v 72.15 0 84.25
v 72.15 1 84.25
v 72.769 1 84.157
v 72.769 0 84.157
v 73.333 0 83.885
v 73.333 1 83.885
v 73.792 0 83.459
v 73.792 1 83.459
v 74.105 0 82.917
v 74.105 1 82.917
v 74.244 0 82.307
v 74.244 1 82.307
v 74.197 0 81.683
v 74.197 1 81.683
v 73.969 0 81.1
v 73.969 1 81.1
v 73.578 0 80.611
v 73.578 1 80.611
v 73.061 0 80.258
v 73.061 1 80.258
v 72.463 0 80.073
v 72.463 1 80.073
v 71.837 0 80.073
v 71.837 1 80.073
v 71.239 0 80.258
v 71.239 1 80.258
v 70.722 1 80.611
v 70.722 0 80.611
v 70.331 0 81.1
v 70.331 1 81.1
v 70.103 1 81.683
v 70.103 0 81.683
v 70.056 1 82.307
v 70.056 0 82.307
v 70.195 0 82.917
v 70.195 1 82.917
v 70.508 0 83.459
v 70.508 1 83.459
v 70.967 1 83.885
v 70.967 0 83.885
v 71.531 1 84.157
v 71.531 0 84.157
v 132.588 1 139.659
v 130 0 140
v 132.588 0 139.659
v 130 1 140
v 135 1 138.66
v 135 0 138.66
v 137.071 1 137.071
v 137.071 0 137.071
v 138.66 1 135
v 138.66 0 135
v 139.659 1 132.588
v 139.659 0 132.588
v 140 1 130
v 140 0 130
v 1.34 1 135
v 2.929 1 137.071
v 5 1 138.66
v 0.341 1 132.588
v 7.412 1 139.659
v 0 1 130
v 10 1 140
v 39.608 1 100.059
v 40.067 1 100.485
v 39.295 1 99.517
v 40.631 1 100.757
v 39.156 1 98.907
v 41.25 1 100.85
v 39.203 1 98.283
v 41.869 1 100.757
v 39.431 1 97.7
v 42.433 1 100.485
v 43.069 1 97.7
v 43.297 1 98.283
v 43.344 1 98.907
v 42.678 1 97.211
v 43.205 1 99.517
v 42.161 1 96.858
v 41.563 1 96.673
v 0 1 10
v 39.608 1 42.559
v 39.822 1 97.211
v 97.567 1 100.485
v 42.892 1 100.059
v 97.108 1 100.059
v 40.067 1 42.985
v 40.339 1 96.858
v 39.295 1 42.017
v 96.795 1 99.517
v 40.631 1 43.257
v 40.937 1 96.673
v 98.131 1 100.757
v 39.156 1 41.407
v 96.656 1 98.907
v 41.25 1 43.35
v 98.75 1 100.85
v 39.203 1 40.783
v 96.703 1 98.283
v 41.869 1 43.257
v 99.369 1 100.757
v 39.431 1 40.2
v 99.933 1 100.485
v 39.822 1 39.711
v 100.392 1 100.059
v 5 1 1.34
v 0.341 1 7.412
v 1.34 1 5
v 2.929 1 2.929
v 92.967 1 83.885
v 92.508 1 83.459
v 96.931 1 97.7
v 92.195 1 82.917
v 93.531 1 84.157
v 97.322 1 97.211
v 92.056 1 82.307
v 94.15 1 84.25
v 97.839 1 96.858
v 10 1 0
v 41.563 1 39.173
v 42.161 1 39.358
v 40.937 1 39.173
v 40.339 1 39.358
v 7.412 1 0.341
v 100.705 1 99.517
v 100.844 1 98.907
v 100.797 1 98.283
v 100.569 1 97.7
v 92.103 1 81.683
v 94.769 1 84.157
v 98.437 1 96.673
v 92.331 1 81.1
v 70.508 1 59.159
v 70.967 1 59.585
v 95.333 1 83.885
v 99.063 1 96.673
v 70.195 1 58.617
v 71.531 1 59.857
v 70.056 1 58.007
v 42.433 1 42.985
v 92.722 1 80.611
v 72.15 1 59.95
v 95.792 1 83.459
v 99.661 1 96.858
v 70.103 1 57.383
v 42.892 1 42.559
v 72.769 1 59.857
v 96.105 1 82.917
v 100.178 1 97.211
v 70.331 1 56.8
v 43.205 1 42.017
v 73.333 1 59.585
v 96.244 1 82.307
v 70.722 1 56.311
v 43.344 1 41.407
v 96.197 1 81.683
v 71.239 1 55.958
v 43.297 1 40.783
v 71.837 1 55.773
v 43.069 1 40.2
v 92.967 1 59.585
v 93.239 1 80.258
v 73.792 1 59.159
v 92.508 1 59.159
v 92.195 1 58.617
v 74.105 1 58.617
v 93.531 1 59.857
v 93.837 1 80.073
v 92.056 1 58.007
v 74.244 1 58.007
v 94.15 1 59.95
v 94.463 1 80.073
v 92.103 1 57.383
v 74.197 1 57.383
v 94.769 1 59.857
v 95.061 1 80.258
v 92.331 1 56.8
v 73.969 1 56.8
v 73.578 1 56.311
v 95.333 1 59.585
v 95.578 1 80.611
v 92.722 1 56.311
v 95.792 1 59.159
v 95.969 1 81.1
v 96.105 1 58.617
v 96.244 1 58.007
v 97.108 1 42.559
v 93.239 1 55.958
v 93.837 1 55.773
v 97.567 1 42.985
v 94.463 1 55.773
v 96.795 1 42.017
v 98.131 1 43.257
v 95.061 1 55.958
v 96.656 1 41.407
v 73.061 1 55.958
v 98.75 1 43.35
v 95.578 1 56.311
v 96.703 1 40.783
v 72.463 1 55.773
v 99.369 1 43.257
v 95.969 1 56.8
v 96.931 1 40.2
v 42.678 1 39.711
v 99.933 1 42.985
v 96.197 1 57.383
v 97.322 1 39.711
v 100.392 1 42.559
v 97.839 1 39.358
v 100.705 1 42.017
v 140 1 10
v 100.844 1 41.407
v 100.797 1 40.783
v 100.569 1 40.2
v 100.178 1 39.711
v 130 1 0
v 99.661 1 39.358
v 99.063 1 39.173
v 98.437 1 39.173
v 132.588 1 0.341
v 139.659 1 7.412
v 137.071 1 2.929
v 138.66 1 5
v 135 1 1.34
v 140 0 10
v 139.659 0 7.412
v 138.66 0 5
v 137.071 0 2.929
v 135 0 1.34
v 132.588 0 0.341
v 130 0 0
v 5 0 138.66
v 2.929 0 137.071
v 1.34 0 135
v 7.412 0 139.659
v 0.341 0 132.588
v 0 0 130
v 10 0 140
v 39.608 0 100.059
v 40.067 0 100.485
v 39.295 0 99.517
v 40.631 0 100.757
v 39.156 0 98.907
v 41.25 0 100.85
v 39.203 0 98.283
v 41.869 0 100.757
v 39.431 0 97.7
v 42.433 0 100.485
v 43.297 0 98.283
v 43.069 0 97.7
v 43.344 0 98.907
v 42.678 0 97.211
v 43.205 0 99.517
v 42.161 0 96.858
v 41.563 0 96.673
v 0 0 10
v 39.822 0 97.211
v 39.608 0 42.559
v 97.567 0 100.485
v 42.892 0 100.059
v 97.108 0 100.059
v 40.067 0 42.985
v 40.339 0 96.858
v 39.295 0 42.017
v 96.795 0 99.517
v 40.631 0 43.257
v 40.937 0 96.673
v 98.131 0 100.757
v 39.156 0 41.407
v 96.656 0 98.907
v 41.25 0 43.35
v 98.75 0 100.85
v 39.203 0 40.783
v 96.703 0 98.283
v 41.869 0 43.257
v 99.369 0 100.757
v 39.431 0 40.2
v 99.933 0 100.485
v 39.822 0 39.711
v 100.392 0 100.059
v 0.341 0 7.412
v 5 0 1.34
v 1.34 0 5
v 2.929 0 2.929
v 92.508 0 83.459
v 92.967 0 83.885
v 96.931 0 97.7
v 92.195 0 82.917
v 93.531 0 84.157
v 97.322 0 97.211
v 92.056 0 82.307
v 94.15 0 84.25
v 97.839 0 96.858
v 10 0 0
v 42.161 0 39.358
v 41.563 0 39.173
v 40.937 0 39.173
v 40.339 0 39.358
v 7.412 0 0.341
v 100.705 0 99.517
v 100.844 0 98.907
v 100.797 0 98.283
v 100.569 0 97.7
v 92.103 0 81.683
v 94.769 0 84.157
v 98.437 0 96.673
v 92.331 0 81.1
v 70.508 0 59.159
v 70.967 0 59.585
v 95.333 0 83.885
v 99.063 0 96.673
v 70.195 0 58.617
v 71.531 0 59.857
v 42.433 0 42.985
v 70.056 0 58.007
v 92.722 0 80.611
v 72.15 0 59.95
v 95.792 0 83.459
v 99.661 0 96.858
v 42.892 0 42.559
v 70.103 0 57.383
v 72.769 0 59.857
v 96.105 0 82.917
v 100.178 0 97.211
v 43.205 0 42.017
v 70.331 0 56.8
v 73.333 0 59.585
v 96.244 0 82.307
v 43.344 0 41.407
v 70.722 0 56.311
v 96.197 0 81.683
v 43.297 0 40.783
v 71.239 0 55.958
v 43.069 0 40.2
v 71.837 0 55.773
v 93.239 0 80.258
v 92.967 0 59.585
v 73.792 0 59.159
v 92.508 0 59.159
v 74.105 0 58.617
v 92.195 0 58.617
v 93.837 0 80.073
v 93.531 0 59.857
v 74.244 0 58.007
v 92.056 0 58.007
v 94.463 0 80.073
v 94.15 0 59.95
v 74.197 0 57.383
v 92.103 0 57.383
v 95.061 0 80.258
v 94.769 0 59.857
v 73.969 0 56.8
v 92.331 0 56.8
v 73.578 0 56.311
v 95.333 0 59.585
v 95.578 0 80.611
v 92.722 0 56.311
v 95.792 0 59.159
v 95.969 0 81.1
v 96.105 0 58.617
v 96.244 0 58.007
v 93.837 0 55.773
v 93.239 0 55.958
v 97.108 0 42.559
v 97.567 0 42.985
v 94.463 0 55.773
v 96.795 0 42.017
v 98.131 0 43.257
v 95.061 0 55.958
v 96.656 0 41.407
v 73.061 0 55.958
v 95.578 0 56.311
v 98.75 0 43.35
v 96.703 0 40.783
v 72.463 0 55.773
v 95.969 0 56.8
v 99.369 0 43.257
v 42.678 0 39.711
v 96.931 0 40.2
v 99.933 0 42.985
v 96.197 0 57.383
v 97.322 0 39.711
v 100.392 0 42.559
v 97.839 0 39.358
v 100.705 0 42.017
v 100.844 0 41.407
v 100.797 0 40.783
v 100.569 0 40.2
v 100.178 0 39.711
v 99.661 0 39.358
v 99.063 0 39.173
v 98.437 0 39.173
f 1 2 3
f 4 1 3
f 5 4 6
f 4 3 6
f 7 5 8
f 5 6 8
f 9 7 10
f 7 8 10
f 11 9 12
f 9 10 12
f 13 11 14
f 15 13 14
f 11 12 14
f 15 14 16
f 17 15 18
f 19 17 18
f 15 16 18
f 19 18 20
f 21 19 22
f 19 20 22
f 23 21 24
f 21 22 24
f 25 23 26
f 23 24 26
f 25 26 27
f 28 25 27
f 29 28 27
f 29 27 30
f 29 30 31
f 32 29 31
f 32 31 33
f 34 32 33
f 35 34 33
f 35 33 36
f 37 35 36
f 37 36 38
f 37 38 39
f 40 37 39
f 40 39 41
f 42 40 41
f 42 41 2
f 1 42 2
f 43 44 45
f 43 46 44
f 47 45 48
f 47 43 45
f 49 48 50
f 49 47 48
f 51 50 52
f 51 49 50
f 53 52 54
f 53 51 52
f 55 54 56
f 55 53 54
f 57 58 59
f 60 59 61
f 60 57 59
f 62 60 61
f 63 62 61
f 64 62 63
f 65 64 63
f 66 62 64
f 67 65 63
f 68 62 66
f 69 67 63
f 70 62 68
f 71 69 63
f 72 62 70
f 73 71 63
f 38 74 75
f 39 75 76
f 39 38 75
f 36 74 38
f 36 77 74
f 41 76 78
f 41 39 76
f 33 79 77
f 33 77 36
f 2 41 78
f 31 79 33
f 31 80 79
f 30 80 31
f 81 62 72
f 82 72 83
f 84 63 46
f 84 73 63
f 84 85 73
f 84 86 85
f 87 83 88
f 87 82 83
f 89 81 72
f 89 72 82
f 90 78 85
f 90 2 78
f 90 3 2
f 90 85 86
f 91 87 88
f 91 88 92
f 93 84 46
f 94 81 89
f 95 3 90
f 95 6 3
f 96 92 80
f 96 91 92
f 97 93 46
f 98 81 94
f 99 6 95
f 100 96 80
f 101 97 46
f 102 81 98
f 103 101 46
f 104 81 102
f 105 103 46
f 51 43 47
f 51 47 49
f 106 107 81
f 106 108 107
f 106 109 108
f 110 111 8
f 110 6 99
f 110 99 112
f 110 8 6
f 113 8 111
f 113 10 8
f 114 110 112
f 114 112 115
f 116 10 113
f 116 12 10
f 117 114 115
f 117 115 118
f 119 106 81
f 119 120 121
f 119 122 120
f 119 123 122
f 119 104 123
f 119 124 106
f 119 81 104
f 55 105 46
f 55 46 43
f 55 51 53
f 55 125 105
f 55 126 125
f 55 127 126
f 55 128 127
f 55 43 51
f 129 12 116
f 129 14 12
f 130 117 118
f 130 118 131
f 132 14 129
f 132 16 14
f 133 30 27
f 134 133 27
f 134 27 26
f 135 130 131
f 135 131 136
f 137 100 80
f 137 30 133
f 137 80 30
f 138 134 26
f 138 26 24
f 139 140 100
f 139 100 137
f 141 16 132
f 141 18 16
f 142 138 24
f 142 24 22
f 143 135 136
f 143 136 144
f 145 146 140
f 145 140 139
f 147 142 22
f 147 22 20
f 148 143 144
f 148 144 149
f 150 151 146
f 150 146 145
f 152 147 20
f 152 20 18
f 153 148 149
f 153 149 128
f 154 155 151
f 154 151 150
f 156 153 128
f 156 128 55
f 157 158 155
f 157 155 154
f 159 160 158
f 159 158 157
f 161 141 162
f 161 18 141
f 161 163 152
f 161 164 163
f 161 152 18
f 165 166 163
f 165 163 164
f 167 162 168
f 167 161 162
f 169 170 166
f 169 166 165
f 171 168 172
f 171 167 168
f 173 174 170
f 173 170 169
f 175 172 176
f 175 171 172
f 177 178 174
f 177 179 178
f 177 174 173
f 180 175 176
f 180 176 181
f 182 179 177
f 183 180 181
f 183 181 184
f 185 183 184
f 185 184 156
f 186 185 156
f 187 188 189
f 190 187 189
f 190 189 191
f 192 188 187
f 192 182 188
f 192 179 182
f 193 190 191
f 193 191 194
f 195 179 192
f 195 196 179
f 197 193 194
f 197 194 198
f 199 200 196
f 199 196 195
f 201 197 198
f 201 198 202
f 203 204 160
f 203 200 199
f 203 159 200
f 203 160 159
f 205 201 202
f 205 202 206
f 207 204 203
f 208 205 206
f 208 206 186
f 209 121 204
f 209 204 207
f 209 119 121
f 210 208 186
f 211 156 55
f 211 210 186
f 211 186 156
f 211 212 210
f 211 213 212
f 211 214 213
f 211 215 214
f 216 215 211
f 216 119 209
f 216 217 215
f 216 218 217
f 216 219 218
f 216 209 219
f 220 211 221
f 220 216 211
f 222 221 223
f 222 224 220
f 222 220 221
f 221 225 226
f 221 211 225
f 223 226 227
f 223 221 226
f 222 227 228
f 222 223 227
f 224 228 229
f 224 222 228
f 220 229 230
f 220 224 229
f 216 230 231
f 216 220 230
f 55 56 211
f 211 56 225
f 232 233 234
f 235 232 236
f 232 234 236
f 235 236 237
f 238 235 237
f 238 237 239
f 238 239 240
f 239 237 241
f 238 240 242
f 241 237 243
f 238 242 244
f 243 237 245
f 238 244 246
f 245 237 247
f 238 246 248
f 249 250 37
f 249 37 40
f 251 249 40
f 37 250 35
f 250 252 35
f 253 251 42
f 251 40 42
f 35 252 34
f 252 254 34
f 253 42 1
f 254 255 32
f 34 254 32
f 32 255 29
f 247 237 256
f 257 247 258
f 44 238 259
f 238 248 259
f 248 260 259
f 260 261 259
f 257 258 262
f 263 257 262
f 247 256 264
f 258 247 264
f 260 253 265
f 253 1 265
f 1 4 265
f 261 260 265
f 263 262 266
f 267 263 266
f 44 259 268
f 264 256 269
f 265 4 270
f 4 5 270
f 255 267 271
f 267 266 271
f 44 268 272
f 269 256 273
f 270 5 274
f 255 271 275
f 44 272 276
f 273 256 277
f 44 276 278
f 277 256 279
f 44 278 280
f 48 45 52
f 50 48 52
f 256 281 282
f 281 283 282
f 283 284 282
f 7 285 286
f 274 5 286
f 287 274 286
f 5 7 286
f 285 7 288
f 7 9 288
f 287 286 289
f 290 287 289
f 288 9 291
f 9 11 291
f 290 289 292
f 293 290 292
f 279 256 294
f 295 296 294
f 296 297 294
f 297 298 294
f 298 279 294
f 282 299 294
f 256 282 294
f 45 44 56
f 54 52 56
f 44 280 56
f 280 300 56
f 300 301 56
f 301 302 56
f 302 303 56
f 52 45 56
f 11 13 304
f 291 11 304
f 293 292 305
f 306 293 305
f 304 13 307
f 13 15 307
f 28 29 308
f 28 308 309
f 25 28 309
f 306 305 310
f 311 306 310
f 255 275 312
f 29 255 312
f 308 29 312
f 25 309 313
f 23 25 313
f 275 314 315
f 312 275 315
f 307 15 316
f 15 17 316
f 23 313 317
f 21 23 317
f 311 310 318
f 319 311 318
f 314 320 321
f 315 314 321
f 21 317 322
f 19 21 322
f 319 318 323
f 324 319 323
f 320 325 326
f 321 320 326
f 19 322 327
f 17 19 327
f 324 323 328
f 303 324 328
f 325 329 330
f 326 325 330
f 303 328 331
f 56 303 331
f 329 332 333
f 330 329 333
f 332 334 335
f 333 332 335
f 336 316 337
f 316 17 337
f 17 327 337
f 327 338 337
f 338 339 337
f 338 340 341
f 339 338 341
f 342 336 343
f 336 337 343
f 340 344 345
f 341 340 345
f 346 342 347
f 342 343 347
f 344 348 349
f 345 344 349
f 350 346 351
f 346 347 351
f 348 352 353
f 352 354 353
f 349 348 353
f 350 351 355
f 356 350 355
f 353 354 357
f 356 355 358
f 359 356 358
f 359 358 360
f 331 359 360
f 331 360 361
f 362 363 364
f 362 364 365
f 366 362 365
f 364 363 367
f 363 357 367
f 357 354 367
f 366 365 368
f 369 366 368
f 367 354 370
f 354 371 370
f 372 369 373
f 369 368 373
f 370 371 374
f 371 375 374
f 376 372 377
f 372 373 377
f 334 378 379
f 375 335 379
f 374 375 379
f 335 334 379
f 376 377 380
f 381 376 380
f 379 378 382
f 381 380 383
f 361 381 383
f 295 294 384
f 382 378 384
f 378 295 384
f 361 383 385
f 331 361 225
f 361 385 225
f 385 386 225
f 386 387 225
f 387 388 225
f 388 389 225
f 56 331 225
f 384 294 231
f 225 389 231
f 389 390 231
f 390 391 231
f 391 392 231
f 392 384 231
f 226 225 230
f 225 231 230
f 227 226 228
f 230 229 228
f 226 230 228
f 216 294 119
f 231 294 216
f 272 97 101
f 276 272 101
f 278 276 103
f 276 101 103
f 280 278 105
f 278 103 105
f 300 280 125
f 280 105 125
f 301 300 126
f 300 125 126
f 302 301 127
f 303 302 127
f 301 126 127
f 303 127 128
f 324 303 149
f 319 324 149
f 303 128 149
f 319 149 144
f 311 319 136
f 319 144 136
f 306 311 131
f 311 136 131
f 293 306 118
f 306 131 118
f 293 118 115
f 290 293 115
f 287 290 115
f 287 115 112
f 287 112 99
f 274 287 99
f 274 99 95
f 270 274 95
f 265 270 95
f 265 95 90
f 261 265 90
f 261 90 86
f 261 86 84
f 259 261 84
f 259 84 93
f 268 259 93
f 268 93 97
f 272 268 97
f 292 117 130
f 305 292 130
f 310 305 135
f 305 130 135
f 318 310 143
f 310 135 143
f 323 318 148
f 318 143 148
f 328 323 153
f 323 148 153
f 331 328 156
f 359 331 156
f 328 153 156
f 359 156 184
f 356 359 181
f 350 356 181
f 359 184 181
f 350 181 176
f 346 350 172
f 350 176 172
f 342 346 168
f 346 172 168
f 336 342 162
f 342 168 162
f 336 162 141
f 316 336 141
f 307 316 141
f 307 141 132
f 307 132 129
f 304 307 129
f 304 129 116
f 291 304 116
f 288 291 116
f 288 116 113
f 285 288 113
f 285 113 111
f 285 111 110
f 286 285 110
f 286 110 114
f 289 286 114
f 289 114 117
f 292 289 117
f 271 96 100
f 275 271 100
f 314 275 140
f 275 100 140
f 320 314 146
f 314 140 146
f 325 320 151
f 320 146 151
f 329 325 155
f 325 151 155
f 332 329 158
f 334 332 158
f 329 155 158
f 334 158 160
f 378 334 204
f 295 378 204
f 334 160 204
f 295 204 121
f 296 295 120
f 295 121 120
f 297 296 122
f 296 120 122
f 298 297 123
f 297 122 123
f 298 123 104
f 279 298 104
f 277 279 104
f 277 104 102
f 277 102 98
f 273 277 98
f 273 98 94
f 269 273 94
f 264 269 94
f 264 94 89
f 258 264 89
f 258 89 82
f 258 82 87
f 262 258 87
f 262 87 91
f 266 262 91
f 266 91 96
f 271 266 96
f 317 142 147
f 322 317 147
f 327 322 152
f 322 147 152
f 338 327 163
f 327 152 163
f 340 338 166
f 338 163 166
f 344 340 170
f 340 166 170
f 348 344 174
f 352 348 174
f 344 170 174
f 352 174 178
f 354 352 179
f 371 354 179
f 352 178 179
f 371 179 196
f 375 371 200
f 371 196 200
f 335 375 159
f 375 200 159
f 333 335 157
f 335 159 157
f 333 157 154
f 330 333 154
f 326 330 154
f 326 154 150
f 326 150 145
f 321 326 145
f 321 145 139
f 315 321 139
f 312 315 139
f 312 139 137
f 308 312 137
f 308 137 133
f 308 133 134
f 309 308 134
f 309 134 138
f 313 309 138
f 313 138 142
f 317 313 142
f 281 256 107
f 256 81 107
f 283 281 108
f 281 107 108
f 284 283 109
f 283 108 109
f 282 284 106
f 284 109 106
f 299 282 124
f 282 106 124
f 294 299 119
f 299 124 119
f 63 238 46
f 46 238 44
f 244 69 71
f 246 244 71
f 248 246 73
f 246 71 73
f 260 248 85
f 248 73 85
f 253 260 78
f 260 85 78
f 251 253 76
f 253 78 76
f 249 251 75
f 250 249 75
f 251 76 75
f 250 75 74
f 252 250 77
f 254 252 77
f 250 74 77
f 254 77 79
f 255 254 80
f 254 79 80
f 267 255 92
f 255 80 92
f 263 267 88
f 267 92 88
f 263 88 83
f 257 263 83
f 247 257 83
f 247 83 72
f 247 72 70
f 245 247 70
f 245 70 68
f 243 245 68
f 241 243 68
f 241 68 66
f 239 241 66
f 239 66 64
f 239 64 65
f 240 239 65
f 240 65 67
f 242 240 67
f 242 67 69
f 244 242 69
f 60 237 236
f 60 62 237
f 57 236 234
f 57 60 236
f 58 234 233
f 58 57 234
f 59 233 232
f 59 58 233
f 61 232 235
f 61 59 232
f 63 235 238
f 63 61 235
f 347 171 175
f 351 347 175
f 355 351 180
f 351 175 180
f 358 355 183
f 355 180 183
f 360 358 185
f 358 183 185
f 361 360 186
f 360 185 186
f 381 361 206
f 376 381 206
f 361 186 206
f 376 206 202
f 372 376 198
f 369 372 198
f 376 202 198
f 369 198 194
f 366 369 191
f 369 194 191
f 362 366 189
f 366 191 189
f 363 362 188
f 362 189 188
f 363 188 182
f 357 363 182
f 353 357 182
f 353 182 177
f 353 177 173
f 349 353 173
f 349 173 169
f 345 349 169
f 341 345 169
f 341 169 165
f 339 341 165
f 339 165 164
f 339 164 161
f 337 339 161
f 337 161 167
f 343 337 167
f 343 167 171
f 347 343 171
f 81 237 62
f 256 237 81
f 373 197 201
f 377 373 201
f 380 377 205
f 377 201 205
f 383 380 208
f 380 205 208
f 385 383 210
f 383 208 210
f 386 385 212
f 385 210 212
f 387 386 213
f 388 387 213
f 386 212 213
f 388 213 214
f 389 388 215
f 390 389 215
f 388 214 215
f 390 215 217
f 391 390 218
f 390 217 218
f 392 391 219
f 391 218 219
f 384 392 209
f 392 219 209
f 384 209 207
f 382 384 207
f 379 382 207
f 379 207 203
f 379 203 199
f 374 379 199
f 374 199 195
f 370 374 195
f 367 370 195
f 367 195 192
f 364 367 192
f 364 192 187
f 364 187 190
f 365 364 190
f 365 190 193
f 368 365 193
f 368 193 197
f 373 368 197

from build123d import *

# Parameters (mm, degrees)
SKETCH1_W           = 140
SKETCH1_H           = 140
BOSS_EXTRUDE1_DEPTH = 1
FILLET1_R           = 10
SKETCH2_R           = 2.1
CUT_EXTRUDE1_DEPTH  = 10


with BuildPart() as part:
    # Sketch1 → Boss-Extrude1 (new body)
    with BuildSketch(Plane(origin=(0, 0, 0), x_dir=(1, 0, 0), z_dir=(0, 1, 0))):
        with Locations((70, -70)):
            Rectangle(SKETCH1_W, SKETCH1_H)
    extrude(amount=BOSS_EXTRUDE1_DEPTH)

    # Fillet1
    fillet1_edges = [part.edges().sort_by_distance(p)[0] for p in [
        (0, 0.5, 0),
        (140, 0.5, 0),
        (140, 0.5, 140),
        (0, 0.5, 140),
    ]]
    fillet(fillet1_edges, radius=FILLET1_R)

    # Sketch2 → Cut-Extrude1 (cut)
    with BuildSketch(Plane(origin=(0, 1, 0), x_dir=(1, 0, 0), z_dir=(0, 1, 0))):
        with Locations(Location((98.75, -98.75, 0), (0, 0, 270))):
            Circle(SKETCH2_R)
        with Locations(Location((41.25, -98.75, 0), (0, 0, 270))):
            Circle(SKETCH2_R)
        with Locations(Location((41.25, -41.25, 0), (0, 0, 270))):
            Circle(SKETCH2_R)
        with Locations(Location((98.75, -41.25, 0), (0, 0, 270))):
            Circle(SKETCH2_R)
        with Locations(Location((72.15, -57.85, 0), (0, 0, 270))):
            Circle(SKETCH2_R)
        with Locations(Location((94.15, -57.85, 0), (0, 0, 270))):
            Circle(SKETCH2_R)
        with Locations(Location((72.15, -82.15, 0), (0, 0, 270))):
            Circle(SKETCH2_R)
        with Locations(Location((94.15, -82.15, 0), (0, 0, 270))):
            Circle(SKETCH2_R)
    extrude(amount=-CUT_EXTRUDE1_DEPTH, mode=Mode.SUBTRACT)


solid = part.part
